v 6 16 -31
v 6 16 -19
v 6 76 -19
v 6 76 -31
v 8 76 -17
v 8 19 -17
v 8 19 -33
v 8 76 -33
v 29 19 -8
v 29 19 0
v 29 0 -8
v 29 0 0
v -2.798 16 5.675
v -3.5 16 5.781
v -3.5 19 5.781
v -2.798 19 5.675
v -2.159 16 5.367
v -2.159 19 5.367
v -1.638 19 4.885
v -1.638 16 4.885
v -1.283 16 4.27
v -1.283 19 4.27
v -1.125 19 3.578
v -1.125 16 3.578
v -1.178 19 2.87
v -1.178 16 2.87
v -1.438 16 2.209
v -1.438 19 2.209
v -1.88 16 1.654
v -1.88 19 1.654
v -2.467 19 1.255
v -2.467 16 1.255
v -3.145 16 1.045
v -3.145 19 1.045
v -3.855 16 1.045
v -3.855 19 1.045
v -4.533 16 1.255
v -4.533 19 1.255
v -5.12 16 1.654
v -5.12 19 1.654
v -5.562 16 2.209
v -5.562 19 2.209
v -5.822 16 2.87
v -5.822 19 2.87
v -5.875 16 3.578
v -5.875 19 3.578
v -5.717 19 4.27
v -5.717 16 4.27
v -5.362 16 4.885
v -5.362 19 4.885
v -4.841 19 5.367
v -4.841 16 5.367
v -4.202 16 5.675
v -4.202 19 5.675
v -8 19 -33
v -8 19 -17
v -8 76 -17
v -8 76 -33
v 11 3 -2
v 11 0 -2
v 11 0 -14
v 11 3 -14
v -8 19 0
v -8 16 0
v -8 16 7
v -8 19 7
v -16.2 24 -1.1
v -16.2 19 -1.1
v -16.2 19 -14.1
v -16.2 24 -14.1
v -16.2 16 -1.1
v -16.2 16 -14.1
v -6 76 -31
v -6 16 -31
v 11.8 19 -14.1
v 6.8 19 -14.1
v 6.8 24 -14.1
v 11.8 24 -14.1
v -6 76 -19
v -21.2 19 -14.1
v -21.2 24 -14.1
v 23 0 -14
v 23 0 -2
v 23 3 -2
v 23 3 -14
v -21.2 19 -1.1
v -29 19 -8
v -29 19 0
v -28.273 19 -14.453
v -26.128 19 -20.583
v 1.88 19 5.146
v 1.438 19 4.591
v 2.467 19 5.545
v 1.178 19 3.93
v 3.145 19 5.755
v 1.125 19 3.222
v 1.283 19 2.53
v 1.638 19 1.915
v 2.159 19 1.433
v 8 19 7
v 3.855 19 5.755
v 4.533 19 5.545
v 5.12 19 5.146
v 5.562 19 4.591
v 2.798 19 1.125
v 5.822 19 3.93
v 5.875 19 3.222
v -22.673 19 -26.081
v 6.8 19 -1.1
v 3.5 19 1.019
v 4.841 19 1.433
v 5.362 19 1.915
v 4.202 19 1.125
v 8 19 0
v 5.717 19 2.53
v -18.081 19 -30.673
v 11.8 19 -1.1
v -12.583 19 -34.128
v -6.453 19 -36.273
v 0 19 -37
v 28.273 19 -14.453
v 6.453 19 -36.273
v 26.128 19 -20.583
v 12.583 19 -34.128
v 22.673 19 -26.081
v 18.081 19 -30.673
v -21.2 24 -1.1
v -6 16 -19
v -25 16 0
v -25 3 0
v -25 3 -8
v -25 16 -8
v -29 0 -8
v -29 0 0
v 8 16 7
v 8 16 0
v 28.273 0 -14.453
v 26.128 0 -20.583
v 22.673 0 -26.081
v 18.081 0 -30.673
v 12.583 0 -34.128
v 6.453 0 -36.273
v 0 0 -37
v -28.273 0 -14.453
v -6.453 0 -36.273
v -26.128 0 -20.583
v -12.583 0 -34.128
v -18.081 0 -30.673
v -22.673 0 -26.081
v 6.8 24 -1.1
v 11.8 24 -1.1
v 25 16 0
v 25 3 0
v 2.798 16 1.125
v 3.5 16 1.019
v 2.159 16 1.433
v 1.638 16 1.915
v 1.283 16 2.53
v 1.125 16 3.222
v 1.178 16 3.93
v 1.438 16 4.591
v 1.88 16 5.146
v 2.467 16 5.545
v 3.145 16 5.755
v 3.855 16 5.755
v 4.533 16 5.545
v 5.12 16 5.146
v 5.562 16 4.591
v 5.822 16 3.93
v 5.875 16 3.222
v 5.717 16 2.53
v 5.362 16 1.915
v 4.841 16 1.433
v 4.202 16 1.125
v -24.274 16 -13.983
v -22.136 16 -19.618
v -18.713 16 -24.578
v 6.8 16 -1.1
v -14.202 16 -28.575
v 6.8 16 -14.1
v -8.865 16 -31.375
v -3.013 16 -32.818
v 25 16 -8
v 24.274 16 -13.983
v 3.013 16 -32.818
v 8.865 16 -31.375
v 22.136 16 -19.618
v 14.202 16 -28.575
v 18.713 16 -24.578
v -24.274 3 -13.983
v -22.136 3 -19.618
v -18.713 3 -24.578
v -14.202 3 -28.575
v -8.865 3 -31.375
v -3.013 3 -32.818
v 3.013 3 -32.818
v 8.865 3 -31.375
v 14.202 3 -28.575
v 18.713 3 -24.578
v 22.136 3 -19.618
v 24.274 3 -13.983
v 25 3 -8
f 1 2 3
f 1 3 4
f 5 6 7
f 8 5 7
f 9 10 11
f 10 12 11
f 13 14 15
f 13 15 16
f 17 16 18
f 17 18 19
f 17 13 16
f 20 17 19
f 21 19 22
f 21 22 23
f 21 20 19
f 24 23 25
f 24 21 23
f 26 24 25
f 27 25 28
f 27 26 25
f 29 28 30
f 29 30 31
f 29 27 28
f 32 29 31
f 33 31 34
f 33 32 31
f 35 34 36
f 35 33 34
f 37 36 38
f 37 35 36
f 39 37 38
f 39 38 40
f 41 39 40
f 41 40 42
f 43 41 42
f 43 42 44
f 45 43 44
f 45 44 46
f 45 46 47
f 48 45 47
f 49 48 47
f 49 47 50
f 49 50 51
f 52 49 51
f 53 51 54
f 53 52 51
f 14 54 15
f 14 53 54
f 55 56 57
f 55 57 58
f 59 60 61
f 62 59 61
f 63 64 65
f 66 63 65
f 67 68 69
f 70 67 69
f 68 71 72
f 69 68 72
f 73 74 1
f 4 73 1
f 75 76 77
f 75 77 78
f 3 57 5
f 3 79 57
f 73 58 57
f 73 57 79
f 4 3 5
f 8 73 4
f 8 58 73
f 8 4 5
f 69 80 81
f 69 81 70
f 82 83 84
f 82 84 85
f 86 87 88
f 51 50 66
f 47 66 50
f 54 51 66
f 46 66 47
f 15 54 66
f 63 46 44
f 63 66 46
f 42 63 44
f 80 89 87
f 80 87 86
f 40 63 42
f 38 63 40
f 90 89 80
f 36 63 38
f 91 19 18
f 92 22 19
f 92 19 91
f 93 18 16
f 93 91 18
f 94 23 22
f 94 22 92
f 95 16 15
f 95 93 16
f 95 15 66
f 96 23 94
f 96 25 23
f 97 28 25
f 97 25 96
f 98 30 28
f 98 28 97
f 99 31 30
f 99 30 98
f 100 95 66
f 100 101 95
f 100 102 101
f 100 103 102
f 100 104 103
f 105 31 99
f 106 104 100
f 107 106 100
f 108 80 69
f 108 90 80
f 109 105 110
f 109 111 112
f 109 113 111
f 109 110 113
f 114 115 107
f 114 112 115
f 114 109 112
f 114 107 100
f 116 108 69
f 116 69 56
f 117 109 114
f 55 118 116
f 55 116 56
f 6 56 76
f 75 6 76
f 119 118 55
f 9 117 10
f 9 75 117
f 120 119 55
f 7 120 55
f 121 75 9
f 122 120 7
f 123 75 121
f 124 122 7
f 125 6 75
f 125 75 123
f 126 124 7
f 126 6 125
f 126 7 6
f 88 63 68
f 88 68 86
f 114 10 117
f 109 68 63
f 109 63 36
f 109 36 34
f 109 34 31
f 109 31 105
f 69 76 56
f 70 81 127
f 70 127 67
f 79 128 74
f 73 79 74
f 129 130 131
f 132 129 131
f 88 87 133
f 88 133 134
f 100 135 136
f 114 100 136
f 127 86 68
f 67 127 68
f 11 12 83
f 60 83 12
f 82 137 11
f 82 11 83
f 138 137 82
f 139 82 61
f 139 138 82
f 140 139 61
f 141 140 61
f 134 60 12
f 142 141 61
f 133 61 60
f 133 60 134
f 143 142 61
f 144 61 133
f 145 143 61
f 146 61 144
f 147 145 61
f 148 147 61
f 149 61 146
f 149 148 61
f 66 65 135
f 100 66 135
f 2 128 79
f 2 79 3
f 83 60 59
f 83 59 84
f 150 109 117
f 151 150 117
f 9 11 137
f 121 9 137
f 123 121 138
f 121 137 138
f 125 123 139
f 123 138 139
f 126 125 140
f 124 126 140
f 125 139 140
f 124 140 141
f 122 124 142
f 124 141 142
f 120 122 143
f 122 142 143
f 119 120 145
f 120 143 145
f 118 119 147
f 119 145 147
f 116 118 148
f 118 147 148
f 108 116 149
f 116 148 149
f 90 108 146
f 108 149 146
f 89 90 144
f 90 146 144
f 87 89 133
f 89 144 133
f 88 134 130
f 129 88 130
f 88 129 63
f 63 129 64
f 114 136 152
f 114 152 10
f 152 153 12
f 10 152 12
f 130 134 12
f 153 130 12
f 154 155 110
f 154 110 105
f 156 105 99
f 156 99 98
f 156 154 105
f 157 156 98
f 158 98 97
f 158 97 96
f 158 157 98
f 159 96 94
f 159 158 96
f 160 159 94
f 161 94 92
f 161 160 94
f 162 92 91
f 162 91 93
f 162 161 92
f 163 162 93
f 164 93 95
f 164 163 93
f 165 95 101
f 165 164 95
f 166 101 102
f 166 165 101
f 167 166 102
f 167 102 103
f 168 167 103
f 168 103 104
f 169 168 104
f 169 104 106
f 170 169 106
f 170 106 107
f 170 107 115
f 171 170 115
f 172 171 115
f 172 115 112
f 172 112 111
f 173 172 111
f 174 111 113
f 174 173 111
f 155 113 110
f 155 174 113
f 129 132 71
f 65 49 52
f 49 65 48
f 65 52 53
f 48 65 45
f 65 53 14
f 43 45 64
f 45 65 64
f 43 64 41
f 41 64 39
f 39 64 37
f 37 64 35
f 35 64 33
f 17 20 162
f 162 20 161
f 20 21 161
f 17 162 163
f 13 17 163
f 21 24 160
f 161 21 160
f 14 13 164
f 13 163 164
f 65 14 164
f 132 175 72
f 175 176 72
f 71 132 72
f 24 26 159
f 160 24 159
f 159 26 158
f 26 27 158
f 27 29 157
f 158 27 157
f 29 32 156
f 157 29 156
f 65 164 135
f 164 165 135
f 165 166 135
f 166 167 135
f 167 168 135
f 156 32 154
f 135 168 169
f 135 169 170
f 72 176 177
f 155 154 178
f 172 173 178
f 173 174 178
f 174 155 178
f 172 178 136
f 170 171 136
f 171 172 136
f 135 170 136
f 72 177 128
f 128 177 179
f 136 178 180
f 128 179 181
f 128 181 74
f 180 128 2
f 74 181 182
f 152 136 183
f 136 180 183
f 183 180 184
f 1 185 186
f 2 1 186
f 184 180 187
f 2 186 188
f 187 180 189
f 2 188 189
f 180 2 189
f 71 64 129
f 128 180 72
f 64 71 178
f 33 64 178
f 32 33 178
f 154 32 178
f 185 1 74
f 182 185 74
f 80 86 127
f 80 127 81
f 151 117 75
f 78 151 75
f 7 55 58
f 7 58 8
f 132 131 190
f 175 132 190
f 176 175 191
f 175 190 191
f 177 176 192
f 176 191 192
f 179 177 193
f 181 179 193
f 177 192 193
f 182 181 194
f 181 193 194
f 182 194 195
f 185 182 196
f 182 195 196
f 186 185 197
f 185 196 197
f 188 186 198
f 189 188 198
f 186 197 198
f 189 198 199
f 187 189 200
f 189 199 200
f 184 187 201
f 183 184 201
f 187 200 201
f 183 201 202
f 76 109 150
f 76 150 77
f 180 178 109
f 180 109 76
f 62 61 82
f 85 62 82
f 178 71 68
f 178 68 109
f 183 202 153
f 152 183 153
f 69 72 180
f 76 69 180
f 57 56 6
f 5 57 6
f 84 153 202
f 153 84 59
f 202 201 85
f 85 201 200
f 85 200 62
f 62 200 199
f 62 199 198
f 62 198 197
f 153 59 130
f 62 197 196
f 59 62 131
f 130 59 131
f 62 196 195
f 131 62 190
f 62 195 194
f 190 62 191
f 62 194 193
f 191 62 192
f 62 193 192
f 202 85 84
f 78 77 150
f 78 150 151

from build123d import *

# Parameters (mm, degrees)
BOSS_EXTRUDE1_DEPTH = 16
SKETCH2_5_W         = 12
SKETCH2_5_H         = 12
BOSS_EXTRUDE2_DEPTH = 3
SKETCH3_W           = 23
SKETCH3_H           = 13
SKETCH3_W_2         = 12
SKETCH3_H_2         = 12
SKETCH3_R           = 2.38125
BOSS_EXTRUDE3_DEPTH = 3
SKETCH3_4_W         = 16
SKETCH3_4_H         = 16
SKETCH3_4_W_2       = 12
SKETCH3_4_H_2       = 12
BOSS_EXTRUDE4_DEPTH = 60
SKETCH3_5_W         = 5
SKETCH3_5_H         = 13
BOSS_EXTRUDE5_DEPTH = 8


with BuildPart() as part:
    # Sketch2 → Boss-Extrude1 (new body)
    with BuildSketch(Plane(origin=(0, 0, 0), x_dir=(1, 0, 0), z_dir=(0, 1, 0))):
        with BuildLine():
            Line((25, 8), (25, 0))
            Line((25, 0), (29, 0))
            Line((29, 0), (29, 8))
            ThreePointArc((29, 8), (0, 37), (-29, 8))
            Line((-29, 8), (-29, 0))
            Line((-29, 0), (-25, 0))
            Line((-25, 0), (-25, 8))
            ThreePointArc((-25, 8), (0, 33), (25, 8))
        make_face()
    extrude(amount=BOSS_EXTRUDE1_DEPTH)

    # Sketch2<5> → Boss-Extrude2 (add)
    with BuildSketch(Plane(origin=(0, 0, 0), x_dir=(1, 0, 0), z_dir=(0, 1, 0))):
        with BuildLine():
            Line((-25, 0), (25, 0))
            Line((25, 0), (25, 8))
            ThreePointArc((25, 8), (0, 33), (-25, 8))
            Line((-25, 8), (-25, 0))
        make_face()
        with Locations((17, 8)):
            Rectangle(SKETCH2_5_W, SKETCH2_5_H, mode=Mode.SUBTRACT)
    extrude(amount=BOSS_EXTRUDE2_DEPTH)

    # Sketch3 → Boss-Extrude3 (add)
    with BuildSketch(Plane(origin=(0, 16, 0), x_dir=(1, 0, 0), z_dir=(0, 1, 0))):
        with BuildLine():
            Line((-29, 8), (-29, 0))
            Line((-29, 0), (-8, 0))
            Line((-8, 0), (-8, -7))
            Line((-8, -7), (8, -7))
            Line((8, -7), (8, 0))
            Line((8, 0), (29, 0))
            Line((29, 0), (29, 8))
            ThreePointArc((29, 8), (0, 37), (-29, 8))
        make_face()
        with Locations((-4.7, 7.6)):
            Rectangle(SKETCH3_W, SKETCH3_H, mode=Mode.SUBTRACT)
        with Locations((0, 25)):
            Rectangle(SKETCH3_W_2, SKETCH3_H_2, mode=Mode.SUBTRACT)
        with Locations((3.5, -3.4)):
            Circle(SKETCH3_R, mode=Mode.SUBTRACT)
        with Locations((-3.5, -3.4)):
            Circle(SKETCH3_R, mode=Mode.SUBTRACT)
    extrude(amount=BOSS_EXTRUDE3_DEPTH)

    # Sketch3<4> → Boss-Extrude4 (add)
    with BuildSketch(Plane(origin=(0, 16, 0), x_dir=(1, 0, 0), z_dir=(0, 1, 0))):
        with Locations((0, 25)):
            Rectangle(SKETCH3_4_W, SKETCH3_4_H)
        with Locations((0, 25)):
            Rectangle(SKETCH3_4_W_2, SKETCH3_4_H_2, mode=Mode.SUBTRACT)
    extrude(amount=BOSS_EXTRUDE4_DEPTH)

    # Sketch3<5> → Boss-Extrude5 (add)
    with BuildSketch(Plane(origin=(0, 16, 0), x_dir=(1, 0, 0), z_dir=(0, 1, 0))):
        with Locations((-18.7, 7.6)):
            Rectangle(SKETCH3_5_W, SKETCH3_5_H)
        Polygon((9, 14.1), (6.8, 14.1), (6.8, 1.1), (11.8, 1.1), (11.8, 14.1), align=None)
    extrude(amount=BOSS_EXTRUDE5_DEPTH)


solid = part.part
